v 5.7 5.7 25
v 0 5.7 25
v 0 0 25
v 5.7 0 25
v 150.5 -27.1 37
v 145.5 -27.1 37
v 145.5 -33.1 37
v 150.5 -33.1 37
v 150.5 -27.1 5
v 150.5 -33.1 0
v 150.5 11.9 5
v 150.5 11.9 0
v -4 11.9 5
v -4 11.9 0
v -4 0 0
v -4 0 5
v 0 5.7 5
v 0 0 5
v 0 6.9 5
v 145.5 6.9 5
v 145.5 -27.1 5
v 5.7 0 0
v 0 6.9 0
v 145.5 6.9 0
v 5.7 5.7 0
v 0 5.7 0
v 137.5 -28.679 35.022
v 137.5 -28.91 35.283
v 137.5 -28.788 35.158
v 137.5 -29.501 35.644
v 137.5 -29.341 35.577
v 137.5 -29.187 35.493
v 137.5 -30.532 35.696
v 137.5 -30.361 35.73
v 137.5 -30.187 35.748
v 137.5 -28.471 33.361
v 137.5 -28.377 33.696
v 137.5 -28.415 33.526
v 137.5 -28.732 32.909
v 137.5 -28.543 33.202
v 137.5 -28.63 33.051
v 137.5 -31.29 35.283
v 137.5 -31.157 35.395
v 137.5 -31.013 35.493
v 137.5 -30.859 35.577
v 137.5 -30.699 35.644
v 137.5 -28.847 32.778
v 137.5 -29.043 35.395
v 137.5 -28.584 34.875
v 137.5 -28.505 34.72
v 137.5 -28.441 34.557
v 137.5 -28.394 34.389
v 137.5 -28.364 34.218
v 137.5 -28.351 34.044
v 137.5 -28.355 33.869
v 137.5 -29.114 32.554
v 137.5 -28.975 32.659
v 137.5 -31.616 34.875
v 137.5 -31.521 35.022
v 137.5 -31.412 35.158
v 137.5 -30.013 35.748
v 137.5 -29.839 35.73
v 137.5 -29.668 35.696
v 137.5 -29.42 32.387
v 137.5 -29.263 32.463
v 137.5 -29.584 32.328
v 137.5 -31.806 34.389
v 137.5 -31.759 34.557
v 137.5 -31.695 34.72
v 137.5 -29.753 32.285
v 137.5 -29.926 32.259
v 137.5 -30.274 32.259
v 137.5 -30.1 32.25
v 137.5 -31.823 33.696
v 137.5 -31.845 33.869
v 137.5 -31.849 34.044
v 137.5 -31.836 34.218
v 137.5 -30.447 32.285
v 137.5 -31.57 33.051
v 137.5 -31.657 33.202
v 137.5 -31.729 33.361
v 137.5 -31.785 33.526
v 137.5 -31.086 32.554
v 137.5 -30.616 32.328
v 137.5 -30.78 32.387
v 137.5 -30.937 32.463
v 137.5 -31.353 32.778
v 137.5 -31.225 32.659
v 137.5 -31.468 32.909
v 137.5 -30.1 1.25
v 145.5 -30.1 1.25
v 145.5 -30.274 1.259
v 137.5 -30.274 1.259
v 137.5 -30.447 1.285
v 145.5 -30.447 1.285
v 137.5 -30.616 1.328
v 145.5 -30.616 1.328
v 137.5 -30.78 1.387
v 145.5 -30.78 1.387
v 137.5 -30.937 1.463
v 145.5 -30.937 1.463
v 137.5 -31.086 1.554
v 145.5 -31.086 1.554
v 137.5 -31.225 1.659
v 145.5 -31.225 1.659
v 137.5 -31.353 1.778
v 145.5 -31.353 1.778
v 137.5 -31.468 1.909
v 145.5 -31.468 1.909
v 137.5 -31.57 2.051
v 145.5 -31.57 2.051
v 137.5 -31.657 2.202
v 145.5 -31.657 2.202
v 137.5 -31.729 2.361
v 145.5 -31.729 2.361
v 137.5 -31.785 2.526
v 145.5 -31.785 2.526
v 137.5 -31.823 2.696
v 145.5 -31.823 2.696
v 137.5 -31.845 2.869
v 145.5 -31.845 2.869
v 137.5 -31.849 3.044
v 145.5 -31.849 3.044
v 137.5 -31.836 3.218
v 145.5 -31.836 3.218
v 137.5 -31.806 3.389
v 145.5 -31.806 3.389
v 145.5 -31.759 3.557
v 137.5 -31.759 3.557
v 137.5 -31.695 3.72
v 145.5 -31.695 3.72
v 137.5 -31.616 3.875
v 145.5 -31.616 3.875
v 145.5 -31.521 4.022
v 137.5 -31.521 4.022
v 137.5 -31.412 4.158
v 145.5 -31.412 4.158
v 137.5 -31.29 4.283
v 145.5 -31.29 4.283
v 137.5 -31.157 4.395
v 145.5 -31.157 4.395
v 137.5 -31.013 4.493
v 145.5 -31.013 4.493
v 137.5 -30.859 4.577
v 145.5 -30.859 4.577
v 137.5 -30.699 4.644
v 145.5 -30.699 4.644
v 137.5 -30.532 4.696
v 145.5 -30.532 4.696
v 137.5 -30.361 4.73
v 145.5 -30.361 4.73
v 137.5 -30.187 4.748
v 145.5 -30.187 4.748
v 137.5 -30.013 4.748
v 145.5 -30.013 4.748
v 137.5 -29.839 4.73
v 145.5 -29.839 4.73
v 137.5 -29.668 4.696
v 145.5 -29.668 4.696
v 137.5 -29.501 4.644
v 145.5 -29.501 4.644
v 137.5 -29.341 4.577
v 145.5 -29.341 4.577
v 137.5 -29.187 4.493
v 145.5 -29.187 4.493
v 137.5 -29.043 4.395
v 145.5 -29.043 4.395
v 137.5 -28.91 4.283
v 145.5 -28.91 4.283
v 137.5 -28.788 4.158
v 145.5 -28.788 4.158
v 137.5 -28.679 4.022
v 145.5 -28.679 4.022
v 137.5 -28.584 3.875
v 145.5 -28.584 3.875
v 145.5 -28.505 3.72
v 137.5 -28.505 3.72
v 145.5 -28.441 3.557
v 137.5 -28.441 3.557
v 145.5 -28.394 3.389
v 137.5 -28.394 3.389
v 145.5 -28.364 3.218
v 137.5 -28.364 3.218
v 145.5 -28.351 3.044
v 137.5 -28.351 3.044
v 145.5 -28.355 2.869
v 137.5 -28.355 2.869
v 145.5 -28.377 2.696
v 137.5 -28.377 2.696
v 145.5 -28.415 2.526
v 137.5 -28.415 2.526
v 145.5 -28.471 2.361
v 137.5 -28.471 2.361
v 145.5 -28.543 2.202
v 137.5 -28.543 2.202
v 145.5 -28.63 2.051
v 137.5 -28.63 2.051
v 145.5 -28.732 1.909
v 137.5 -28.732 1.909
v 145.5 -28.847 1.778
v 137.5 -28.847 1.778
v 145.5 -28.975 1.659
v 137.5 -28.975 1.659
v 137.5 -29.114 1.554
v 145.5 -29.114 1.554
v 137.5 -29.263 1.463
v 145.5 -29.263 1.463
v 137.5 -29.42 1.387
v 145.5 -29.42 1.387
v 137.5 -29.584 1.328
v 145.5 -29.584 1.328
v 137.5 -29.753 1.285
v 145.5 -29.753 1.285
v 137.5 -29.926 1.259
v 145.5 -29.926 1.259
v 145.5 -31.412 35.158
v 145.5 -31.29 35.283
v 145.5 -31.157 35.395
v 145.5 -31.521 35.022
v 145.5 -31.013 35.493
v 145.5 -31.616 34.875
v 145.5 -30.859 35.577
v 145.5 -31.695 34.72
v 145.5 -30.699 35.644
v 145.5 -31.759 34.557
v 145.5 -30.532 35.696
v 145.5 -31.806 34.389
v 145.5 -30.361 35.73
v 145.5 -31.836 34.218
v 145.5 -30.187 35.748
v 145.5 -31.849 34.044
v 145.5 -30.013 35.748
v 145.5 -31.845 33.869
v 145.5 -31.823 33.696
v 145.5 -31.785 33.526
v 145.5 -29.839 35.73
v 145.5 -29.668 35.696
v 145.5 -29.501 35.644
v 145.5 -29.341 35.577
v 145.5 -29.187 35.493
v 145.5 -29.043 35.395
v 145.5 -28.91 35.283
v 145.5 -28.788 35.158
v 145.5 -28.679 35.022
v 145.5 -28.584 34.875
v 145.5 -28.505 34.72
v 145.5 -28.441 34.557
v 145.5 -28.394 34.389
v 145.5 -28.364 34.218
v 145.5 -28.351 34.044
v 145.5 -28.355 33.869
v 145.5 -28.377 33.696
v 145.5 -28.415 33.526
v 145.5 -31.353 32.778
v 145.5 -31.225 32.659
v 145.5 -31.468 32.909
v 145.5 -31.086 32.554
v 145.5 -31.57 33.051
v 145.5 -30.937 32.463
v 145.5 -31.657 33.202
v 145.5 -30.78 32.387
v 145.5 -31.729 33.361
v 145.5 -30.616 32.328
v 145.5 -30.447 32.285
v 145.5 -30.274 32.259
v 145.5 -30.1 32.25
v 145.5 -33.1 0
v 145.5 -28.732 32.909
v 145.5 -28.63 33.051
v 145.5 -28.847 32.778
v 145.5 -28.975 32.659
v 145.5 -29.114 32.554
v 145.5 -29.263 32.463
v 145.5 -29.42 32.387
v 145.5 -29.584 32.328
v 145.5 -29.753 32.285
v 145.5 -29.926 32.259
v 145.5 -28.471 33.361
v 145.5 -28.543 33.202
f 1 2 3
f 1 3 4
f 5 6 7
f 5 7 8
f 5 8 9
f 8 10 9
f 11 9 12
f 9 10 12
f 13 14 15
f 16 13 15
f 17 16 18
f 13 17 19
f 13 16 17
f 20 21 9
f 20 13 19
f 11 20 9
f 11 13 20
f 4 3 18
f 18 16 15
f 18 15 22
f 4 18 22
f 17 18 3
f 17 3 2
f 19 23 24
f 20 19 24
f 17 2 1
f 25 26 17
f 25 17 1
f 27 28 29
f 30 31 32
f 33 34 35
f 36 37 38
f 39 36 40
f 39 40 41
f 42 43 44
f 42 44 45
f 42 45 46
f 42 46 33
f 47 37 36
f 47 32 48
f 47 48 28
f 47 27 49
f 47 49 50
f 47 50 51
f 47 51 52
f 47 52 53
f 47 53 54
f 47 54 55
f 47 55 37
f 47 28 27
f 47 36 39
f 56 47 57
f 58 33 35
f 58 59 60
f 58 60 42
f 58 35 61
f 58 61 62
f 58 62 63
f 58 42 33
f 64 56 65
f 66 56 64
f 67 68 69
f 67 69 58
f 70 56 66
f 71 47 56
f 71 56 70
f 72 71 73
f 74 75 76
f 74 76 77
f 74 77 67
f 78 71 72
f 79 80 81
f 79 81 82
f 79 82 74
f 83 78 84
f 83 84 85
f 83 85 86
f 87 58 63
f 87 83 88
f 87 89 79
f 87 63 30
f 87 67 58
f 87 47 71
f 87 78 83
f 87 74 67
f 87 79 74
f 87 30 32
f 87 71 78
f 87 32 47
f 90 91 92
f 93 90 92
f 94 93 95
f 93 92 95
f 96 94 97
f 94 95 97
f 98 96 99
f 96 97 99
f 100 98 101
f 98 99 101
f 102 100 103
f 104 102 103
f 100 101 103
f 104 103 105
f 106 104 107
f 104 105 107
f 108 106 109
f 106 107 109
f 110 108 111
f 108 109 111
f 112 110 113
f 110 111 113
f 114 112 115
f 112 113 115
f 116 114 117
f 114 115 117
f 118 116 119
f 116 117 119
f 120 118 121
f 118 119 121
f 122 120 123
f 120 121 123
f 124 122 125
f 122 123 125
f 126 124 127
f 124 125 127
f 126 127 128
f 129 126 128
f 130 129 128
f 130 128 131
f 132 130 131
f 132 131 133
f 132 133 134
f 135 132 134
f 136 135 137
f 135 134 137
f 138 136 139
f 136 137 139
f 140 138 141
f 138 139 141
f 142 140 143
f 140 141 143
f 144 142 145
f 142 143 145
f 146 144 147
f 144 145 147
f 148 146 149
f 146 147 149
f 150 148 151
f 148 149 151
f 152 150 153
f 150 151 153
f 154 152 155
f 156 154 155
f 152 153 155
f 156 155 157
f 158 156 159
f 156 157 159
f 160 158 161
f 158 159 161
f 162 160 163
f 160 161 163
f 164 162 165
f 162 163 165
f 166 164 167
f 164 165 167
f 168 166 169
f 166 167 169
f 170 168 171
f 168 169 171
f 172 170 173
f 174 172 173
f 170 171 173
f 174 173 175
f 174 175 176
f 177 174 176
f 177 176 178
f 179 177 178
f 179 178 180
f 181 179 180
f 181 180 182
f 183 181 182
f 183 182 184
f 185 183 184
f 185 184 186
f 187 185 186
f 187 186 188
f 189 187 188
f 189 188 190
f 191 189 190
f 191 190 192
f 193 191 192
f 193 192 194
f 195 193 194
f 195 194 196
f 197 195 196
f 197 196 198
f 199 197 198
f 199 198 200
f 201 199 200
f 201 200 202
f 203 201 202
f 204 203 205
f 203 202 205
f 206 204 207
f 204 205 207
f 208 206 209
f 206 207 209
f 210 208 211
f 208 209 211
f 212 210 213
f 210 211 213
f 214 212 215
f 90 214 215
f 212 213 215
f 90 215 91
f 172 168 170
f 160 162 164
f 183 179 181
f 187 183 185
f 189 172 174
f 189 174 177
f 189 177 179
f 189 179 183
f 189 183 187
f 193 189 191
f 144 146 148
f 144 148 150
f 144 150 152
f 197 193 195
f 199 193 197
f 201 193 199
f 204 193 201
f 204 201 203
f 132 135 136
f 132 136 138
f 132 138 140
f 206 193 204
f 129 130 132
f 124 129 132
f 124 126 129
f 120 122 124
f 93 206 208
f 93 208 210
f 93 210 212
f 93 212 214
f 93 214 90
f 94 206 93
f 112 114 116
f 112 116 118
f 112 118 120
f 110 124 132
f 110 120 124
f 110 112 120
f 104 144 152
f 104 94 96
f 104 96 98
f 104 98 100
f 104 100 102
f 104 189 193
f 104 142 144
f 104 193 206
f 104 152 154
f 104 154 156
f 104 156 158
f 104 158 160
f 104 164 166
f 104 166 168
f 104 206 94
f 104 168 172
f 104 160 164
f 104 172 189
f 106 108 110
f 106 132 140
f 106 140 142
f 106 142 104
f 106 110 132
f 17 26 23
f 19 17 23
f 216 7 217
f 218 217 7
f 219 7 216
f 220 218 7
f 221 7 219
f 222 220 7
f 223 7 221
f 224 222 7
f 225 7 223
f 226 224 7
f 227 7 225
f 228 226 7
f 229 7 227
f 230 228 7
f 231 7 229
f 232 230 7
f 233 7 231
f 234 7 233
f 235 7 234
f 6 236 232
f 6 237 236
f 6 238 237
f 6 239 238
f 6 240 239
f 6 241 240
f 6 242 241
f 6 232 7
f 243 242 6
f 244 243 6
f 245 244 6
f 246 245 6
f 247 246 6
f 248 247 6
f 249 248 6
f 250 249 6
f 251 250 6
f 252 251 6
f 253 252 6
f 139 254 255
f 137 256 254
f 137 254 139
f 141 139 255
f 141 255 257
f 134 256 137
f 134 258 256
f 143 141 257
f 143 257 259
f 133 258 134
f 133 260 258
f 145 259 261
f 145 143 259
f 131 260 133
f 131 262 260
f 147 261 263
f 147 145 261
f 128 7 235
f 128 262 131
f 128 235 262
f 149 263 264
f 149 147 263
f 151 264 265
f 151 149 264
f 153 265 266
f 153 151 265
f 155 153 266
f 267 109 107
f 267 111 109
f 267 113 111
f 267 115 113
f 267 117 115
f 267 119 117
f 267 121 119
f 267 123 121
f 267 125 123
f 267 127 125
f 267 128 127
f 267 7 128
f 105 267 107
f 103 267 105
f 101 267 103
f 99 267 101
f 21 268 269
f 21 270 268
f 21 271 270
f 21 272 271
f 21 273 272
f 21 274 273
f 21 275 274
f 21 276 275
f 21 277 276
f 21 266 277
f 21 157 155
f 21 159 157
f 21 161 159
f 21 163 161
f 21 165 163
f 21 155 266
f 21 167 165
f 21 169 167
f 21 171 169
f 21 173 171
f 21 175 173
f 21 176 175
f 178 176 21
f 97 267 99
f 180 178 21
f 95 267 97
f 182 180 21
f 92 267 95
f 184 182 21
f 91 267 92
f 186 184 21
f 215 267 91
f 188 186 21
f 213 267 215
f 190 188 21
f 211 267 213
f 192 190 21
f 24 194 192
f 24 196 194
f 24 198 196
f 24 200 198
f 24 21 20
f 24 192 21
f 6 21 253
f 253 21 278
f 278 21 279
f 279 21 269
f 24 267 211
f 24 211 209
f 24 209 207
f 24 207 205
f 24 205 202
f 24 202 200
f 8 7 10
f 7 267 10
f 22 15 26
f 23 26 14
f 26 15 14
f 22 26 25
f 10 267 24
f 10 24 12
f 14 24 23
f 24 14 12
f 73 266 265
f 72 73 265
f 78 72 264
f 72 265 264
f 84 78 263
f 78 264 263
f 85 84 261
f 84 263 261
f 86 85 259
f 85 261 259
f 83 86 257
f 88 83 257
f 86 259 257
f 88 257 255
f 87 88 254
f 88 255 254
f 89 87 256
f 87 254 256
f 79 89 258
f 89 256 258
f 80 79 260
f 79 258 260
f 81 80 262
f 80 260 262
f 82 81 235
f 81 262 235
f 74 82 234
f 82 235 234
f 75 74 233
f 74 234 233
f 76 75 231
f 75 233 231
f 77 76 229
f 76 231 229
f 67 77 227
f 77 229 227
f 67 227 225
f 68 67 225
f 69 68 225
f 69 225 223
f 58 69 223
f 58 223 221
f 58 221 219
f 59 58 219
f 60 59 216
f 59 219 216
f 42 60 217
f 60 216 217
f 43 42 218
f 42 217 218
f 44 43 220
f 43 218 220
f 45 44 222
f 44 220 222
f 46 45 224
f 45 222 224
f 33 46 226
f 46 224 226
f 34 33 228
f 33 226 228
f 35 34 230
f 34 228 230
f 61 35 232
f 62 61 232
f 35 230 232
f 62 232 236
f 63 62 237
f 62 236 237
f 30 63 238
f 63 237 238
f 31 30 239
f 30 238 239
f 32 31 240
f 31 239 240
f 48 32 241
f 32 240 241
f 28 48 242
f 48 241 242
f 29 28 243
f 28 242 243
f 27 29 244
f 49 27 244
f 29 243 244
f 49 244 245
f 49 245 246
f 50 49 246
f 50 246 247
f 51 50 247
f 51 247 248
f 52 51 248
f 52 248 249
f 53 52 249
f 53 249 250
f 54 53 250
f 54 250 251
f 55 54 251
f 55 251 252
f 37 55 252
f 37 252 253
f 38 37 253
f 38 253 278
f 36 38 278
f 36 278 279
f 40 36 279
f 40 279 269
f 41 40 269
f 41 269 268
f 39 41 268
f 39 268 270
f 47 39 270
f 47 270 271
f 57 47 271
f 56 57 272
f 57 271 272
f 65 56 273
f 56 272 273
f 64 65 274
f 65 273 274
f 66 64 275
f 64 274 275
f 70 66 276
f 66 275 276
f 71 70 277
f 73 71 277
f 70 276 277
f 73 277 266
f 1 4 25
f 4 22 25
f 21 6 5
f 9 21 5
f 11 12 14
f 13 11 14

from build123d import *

# Parameters (mm, degrees)
BOSS_EXTRUDE1_DEPTH = 5
SKETCH2_W           = 5.7
SKETCH2_H           = 5.7
BOSS_EXTRUDE2_DEPTH = 20
SKETCH3_W           = 5
SKETCH3_H           = 6
BOSS_EXTRUDE3_DEPTH = 32
SKETCH4_R           = 1.75
BOSS_EXTRUDE4_DEPTH = 8


with BuildPart() as part:
    # Sketch1 → Boss-Extrude1 (new body)
    with BuildSketch(Plane.XY):
        Polygon((0, 5.7), (0, 6.9), (5.5, 6.9), (145.5, 6.9), (145.5, -33.1), (150.5, -33.1), (150.5, 6.9), (150.5, 11.9), (5.5, 11.9), (-4, 11.9), (-4, 0), (0, 0), (5.7, 0), (5.7, 5.7), align=None)
    extrude(amount=BOSS_EXTRUDE1_DEPTH)

    # Sketch2 → Boss-Extrude2 (add)
    with BuildSketch(Plane.XY.offset(5)):
        with Locations((2.85, 2.85)):
            Rectangle(SKETCH2_W, SKETCH2_H)
    extrude(amount=BOSS_EXTRUDE2_DEPTH)

    # Sketch3 → Boss-Extrude3 (add)
    with BuildSketch(Plane.XY.offset(5)):
        with Locations((148, -30.1)):
            Rectangle(SKETCH3_W, SKETCH3_H)
    extrude(amount=BOSS_EXTRUDE3_DEPTH)

    # Sketch4 → Boss-Extrude4 (add)
    with BuildSketch(Plane.ZY.offset(-145.5)):
        with Locations(Location((3, -30.1, 0), (0, 0, 180))):
            Circle(SKETCH4_R)
        with Locations(Location((34, -30.1, 0), (0, 0, 180))):
            Circle(SKETCH4_R)
    extrude(amount=BOSS_EXTRUDE4_DEPTH)


solid = part.part
